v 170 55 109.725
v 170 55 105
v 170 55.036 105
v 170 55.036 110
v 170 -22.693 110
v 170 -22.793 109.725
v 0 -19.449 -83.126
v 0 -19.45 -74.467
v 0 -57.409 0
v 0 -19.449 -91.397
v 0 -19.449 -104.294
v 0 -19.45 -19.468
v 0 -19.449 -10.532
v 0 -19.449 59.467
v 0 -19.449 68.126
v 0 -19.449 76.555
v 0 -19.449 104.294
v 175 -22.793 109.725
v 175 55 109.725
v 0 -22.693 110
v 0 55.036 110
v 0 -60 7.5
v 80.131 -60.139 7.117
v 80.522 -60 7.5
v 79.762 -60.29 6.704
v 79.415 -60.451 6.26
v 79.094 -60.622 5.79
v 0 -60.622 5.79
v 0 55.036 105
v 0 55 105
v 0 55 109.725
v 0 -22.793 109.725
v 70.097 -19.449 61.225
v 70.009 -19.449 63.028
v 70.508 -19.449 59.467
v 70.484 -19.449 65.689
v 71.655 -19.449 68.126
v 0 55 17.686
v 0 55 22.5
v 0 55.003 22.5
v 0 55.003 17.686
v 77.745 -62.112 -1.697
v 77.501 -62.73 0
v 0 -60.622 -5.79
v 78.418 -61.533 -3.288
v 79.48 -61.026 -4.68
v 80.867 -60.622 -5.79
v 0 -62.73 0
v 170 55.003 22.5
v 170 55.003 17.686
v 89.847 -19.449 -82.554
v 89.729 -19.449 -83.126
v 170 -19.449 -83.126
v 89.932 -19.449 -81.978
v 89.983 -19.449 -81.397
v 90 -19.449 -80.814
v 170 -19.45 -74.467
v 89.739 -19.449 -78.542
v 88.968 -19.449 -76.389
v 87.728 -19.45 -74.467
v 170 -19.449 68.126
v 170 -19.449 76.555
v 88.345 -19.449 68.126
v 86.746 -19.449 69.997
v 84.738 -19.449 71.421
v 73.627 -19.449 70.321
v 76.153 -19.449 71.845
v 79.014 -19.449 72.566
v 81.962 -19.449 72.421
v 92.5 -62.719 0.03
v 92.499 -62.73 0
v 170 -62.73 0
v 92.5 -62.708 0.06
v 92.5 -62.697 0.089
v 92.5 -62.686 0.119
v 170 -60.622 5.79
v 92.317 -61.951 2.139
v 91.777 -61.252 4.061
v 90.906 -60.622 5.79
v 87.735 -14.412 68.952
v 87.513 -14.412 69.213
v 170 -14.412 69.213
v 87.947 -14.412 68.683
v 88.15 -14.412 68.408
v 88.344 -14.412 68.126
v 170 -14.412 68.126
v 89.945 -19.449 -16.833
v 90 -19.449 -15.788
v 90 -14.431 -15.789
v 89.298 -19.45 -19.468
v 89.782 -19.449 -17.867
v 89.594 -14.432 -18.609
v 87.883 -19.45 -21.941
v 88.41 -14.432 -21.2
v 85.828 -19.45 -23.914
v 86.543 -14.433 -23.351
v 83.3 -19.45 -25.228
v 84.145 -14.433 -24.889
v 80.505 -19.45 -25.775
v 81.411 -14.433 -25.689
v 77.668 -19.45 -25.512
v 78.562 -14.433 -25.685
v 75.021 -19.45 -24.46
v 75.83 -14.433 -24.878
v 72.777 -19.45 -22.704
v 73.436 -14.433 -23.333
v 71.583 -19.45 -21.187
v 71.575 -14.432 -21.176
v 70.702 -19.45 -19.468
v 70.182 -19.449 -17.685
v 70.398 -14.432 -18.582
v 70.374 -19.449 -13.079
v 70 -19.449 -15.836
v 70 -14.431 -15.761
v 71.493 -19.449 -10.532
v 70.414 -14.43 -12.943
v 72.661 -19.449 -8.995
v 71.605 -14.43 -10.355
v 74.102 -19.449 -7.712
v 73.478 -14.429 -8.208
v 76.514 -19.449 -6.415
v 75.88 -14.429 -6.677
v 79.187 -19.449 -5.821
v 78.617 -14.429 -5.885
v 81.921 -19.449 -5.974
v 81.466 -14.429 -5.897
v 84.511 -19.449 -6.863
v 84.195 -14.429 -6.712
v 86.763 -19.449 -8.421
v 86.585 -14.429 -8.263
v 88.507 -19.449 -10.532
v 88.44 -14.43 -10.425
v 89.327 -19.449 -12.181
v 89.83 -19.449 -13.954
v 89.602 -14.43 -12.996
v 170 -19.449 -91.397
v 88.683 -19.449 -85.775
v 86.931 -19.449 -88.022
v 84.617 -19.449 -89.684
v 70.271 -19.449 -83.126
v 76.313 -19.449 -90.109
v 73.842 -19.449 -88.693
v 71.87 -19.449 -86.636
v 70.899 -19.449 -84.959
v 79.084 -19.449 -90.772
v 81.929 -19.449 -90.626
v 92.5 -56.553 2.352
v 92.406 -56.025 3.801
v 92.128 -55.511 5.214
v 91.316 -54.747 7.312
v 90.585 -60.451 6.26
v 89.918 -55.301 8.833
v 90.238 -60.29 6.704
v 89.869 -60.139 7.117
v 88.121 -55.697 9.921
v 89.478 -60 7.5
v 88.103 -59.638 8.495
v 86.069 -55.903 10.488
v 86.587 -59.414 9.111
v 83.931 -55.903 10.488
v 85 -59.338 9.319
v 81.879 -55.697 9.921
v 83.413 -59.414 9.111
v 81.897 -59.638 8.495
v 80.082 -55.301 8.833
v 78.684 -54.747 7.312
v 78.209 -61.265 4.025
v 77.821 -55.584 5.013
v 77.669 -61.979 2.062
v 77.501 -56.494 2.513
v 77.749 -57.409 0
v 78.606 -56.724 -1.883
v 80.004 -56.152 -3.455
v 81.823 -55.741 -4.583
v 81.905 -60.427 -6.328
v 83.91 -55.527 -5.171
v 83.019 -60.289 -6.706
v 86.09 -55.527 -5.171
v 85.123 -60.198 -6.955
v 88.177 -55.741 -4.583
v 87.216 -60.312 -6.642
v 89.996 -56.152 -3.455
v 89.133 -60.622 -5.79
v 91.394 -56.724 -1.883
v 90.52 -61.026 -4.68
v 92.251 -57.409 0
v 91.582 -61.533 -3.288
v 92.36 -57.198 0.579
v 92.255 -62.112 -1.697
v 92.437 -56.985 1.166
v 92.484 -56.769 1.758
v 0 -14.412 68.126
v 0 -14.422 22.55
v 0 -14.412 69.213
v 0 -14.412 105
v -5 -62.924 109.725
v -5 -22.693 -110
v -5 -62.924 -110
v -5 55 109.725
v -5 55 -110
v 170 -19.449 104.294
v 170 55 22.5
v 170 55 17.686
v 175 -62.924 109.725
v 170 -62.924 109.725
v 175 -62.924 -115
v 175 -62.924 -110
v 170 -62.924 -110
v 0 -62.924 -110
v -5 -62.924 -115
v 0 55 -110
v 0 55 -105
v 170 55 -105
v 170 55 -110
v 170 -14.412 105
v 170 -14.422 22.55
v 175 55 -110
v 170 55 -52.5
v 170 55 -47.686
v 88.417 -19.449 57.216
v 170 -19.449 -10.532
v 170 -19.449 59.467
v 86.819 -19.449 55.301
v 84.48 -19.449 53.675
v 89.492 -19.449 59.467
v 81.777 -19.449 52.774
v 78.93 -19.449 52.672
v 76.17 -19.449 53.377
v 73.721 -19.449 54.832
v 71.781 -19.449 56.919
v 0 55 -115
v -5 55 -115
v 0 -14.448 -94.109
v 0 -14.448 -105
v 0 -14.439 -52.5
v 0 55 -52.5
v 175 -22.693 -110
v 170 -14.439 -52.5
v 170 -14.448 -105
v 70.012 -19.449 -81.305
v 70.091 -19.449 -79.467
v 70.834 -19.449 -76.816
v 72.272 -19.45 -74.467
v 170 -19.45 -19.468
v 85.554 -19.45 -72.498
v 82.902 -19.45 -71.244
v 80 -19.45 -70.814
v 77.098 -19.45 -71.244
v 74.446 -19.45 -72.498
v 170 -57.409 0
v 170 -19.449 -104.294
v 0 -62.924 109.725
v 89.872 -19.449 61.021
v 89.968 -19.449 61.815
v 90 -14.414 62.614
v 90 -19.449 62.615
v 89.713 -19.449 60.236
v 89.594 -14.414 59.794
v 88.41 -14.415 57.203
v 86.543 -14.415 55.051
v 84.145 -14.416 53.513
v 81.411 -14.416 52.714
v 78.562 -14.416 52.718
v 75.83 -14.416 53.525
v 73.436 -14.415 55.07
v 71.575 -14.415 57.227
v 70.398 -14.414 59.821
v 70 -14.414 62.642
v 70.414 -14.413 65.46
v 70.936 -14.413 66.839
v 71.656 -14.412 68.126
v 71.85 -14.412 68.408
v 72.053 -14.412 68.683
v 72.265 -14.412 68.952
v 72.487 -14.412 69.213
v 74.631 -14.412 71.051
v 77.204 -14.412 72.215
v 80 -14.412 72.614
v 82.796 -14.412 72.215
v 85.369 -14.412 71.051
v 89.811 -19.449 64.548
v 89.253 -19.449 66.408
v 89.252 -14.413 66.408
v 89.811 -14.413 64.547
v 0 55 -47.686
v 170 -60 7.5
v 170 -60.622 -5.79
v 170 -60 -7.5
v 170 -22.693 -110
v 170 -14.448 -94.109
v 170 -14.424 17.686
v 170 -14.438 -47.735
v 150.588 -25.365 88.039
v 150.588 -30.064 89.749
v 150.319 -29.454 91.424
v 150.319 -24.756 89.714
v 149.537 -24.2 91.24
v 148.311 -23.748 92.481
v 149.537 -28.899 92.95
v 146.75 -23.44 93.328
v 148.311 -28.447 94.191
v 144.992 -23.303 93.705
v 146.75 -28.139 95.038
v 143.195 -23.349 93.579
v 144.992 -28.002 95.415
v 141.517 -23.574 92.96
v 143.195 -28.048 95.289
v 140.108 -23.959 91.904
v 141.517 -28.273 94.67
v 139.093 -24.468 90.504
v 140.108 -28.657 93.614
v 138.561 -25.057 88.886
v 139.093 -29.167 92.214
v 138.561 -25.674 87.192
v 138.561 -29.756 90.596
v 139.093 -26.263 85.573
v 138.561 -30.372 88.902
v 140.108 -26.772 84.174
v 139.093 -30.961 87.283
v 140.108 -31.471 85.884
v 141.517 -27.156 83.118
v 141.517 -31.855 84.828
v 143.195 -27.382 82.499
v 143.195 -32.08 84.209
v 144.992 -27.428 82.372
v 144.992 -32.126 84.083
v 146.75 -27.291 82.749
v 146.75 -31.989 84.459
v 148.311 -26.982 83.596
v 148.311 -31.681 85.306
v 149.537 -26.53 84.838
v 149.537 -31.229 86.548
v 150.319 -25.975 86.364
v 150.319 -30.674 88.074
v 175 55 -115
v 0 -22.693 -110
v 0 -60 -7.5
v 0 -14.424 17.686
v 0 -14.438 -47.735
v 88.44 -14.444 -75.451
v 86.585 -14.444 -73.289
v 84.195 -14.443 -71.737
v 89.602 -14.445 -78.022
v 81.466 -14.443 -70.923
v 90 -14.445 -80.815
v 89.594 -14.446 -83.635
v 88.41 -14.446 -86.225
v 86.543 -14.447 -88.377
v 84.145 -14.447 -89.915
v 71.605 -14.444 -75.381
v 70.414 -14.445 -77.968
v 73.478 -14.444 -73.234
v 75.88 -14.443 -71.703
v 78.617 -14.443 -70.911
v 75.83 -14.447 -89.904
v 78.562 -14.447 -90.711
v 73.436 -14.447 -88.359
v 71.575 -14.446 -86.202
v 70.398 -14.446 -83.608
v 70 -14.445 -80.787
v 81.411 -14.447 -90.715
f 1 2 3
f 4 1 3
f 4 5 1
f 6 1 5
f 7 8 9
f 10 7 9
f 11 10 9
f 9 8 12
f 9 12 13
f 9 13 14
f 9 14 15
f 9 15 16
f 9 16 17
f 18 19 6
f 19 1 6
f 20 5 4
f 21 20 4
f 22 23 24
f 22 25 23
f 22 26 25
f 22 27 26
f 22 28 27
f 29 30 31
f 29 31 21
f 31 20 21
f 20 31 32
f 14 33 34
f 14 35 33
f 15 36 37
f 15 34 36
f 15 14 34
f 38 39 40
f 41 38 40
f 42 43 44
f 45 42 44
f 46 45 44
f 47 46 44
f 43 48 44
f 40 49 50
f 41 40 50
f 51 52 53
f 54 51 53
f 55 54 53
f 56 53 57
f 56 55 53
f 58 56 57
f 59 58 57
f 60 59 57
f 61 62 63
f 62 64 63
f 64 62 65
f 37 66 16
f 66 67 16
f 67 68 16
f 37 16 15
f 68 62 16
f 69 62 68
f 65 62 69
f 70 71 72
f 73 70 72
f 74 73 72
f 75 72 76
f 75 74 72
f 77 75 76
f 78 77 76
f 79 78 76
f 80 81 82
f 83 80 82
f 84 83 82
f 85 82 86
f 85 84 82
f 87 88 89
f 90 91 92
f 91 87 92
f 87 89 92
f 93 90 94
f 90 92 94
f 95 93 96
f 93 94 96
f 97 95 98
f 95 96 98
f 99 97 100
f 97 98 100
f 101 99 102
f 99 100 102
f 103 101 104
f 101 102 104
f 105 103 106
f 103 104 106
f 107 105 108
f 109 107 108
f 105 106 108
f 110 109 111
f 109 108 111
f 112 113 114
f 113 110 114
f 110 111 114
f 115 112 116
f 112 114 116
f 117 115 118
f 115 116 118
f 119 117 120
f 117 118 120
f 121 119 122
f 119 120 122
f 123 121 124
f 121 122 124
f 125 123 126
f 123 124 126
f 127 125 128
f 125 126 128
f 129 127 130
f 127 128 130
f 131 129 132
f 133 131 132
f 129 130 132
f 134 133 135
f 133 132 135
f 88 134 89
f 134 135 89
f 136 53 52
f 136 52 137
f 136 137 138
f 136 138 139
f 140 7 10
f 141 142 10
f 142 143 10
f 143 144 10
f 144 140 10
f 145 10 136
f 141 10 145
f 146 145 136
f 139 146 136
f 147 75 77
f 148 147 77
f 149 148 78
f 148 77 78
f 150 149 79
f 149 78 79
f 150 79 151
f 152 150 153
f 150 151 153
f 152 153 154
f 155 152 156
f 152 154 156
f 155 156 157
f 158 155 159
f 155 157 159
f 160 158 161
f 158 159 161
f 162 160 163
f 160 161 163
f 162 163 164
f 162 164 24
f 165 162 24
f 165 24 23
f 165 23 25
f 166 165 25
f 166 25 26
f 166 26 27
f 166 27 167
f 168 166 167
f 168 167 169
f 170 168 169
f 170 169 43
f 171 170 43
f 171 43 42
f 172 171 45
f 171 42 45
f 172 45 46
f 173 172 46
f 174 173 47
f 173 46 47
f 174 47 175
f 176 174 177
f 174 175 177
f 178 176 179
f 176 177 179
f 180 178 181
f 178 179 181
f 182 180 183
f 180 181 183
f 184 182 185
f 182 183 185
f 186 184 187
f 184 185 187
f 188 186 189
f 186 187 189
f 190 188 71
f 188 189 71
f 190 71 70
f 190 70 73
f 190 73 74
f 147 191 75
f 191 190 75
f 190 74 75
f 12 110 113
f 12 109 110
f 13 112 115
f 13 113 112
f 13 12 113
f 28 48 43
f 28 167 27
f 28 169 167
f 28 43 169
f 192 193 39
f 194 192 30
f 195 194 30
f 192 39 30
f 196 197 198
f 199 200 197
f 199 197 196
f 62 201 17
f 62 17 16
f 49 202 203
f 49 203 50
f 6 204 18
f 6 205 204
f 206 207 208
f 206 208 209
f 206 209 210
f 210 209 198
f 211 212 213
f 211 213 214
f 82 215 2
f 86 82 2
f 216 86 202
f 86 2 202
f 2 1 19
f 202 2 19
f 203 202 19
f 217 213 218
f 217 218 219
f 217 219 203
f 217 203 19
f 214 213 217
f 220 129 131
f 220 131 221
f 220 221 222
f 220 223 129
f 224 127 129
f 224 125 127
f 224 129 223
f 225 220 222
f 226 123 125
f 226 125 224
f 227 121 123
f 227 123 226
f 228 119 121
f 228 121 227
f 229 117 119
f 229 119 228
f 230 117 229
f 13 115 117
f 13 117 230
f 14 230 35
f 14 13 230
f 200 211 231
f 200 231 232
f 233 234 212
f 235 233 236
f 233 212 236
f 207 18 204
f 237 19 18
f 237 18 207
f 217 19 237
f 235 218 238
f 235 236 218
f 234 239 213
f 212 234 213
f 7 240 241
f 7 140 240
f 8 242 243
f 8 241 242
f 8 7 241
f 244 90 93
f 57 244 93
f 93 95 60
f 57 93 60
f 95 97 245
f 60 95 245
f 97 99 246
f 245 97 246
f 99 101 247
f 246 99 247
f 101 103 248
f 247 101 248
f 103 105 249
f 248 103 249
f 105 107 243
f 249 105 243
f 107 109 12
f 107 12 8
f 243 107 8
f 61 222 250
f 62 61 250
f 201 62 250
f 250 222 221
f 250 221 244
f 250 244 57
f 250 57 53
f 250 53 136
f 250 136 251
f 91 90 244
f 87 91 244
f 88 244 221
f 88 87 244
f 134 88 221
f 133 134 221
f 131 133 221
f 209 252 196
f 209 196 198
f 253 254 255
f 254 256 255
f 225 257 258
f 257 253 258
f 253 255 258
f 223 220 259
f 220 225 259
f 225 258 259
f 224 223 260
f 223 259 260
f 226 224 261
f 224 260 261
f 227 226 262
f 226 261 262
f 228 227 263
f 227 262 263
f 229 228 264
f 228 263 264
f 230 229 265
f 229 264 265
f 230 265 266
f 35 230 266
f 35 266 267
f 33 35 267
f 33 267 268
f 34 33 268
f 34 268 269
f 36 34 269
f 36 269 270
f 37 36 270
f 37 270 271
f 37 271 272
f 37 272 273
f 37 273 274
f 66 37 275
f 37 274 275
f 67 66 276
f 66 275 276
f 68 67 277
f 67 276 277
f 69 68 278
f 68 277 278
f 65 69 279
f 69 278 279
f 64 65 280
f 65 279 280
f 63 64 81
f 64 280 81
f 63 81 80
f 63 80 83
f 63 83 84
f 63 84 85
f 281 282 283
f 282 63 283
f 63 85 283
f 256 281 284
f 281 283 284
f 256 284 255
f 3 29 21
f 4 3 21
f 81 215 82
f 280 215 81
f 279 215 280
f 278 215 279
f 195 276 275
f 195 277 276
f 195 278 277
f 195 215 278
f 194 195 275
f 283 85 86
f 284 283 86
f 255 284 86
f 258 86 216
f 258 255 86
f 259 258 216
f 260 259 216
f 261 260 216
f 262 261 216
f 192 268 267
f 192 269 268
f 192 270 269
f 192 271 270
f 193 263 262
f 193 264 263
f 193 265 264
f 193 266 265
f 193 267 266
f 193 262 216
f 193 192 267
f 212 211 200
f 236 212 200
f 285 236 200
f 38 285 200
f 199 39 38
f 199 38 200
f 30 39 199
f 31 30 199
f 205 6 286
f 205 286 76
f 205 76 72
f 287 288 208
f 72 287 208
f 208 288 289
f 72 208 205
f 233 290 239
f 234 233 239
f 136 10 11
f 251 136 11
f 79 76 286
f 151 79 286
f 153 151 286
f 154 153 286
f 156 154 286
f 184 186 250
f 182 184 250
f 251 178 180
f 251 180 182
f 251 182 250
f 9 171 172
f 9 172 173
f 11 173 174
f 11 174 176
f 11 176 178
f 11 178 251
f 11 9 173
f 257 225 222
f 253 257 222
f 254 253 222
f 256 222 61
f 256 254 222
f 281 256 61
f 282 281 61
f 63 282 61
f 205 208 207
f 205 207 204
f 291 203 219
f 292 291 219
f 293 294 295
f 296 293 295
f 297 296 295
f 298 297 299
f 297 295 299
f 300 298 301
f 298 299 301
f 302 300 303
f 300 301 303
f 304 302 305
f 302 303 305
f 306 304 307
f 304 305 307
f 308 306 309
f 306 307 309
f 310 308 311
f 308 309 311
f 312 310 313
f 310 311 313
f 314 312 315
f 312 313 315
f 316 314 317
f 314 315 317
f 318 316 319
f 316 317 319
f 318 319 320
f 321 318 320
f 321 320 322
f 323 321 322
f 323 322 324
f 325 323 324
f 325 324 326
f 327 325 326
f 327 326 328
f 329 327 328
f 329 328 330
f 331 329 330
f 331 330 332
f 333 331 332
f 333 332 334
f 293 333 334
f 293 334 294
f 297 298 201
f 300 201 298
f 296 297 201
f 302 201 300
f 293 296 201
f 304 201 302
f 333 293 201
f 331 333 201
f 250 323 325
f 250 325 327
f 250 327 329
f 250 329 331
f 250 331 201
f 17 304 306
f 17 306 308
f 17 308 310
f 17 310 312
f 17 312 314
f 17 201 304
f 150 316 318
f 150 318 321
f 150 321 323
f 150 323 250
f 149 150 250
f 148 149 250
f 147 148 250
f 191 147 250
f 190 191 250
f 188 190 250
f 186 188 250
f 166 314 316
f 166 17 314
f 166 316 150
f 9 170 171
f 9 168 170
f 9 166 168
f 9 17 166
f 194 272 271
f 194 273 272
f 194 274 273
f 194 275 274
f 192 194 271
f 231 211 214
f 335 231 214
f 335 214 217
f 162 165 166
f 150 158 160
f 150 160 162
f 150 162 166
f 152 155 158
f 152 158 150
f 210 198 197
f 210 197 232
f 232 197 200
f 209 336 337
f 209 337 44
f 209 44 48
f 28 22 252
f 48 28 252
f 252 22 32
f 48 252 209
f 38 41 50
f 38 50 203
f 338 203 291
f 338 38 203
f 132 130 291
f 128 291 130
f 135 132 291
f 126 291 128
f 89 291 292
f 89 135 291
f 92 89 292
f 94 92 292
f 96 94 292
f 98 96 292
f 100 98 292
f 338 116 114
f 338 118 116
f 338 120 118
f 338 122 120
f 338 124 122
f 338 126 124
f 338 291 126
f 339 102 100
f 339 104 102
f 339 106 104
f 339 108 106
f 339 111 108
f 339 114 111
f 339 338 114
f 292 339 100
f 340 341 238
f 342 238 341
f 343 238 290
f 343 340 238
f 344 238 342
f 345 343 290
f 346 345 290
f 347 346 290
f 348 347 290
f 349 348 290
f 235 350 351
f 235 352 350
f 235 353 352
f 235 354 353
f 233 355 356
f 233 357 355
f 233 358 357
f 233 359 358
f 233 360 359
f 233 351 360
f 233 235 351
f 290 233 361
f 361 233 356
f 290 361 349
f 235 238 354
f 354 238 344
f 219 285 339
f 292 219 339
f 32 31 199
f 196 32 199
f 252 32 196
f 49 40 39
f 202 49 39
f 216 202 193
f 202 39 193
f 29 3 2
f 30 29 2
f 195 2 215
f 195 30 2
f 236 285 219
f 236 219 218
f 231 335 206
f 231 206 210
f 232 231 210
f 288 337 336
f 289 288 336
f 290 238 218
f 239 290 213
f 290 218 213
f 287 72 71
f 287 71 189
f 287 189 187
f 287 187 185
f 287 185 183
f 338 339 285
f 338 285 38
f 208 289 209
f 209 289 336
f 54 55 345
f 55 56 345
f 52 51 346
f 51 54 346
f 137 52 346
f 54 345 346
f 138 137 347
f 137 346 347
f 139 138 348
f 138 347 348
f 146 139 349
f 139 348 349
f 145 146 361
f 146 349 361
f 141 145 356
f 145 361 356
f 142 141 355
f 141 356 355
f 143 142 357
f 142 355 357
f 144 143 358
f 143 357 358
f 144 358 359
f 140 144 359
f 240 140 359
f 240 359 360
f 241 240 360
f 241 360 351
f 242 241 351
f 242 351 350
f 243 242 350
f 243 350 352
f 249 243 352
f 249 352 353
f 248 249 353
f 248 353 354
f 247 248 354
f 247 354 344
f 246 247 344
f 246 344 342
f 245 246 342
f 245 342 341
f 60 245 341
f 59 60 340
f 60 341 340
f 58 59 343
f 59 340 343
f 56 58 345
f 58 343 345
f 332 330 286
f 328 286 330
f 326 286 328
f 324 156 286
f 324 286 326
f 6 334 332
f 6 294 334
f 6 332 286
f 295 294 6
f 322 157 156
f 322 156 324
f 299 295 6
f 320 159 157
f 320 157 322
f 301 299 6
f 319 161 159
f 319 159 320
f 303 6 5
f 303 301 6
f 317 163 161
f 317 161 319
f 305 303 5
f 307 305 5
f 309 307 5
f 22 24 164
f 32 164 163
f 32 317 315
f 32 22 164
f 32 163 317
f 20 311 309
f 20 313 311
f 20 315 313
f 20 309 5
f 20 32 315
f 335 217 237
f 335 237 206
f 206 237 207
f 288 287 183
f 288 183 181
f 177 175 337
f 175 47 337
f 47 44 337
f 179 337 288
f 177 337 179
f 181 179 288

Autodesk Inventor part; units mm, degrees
ref_plane "YZ Plane" through (0, 0, 0) normal (1, 0, 0) x (0, 1, 0)
ref_plane "XZ Plane" through (0, 0, 0) normal (0, 1, 0) x (-1, 0, 0)
ref_plane "XY Plane" through (0, 0, 0) normal (0, 0, 1) x (1, 0, 0)
sketch "Sketch1" plane through (0, 0, 0) normal (1, 0, 0) x (0, 1, 0)
  line L0 (-22.6931, 110) -> (55.0359, 110)
  line L1 (55, -110) -> (-22.6931, -110)
  line L2 (-62.7298, 0) -> (-22.6931, -110)
  line L3 (-62.7298, 0) -> (-22.6931, 110)
  line L4 (-57.4089, 0) -> (-19.449, -104.2938)
  line L5 (-14.4482, -105) -> (55, -105)
  line L6 (55.0359, 105) -> (-14.4122, 105)
  line L7 (-19.449, 104.2938) -> (-57.4089, 0)
  line L8 (55.0034, 17.6855) -> (-14.4593, 17.6855)
  line L9 (55.0034, 22.5) -> (-14.4456, 22.5496)
  line L10 (55, -52.5) -> (-14.449, -52.5)
  line L11 (55, -47.6855) -> (-14.449, -47.7352)
  line L12 (-60.6224, -5.7899) -> (-60, -7.5)
  line L13 (-60.6224, 5.7899) -> (-60, 7.5)
  line L14 (-14.4122, 105) -> (-14.4122, 68.1255)
  line L15 (-14.4456, 59.4672) -> (-14.4456, 22.5496)
  line L16 (-19.449, 104.2938) -> (-19.449, 68.1255)
  line L17 (-14.4593, 17.6855) -> (-14.4593, -10.5317)
  line L18 (-14.449, -19.4683) -> (-14.449, -47.7352)
  line L19 (-19.4705, 59.4672) -> (-19.4705, -10.5317)
  line L20 (-14.449, -52.5) -> (-14.449, -74.4672)
  line L21 (-14.4482, -83.1255) -> (-14.4482, -105.0928)
  line L22 (-19.4499, -19.4683) -> (-19.4499, -74.4672)
  line L23 (-19.449, -83.1255) -> (-19.449, -104.2938)
  line L24 (-19.449, -74.4672) -> (-19.4499, -74.4672)
  line L25 (-14.4593, -83.1255) -> (-14.4482, -83.1255)
  line L26 (-19.4499, -19.4683) -> (-19.449, -19.4683)
  line L27 (-19.4705, -10.5317) -> (-19.449, -10.5317)
  line L28 (-14.4122, 68.1255) -> (-14.4125, 68.1255)
  line L29 (-19.4705, 59.4672) -> (-19.449, 59.4672)
  line L30 (55.0359, 105) -> (55.0359, 110)
  line L31 (55.0034, 22.5) -> (55.0034, 17.6855)
  line L32 (55, -47.6855) -> (55, -52.5)
  line L33 (55, -105) -> (55, -110)
  line L34 (-19.449, -91.3967) -> (-19.449, 76.5553)
  line L35 (-14.4122, 69.213) -> (-14.4225, 22.5496)
  line L36 (-14.4236, 17.6855) -> (-14.438, -47.7351)
  line L37 (-14.439, -52.5) -> (-14.4482, -94.1091)
  point P0 (0, 0)
extrude "Extrusion1" add sketch "Sketch1" along normal blind 170
sketch "Sketch2" plane through (0, -14.4236, 17.6855) normal (0, 1, -0.0002) x (1, 0, 0)
  circle A0 centre (80, 33.4744) radius 10
  circle A1 centre (80, 98.5003) radius 10
  circle A2 centre (80, -44.9284) radius 10
  point P0 (0, 17.6824)
  dimension "d24" = 20
  dimension "d25" = 20
  dimension "d26" = 20
extrude "Extrusion2" cut sketch "Sketch2" against normal blind 6
sketch "Sketch3" plane through (0, -22.6931, -110) normal (0, -0.9397, -0.342) x (1, 0, 0)
  point P0 (0, 95.6047)
sketch "Sketch4" plane through (0, -22.6931, -110) normal (0, -0.9397, -0.342) x (1, 0, 0)
  line L0 (0, 117.1568) -> (170, 117.1568) projected
  circle A0 centre (85, 117.1568) radius 7.5
  point P0 (0, 95.6047)
  dimension "d29" = 15
extrude "Extrusion3" cut sketch "Sketch4" against normal blind 10
sketch "Sketch5" plane through (0, 0, 0) normal (-1, 0, 0) x (0, 0, 1)
  line L0 (-110, -22.6931) -> (-110, 55) projected
  line L1 (-110, 55) -> (109.7253, 55)
  line L2 (109.7253, 55) -> (109.7253, -62.9244)
  line L3 (109.7253, -62.9244) -> (-110, -62.9244)
  line L4 (-110, -62.9244) -> (-110, 55)
  point P0 (0, 0)
extrude "Extrusion4" add sketch "Sketch5" along normal blind 5
sketch "Sketch6" plane through (170, 0, 0) normal (1, 0, 0) x (0, 0, -1)
  line L0 (-109.7253, 55) -> (-109.7253, -22.793) projected
  line L1 (110, -22.6931) -> (110, -62.9244) projected
  line L2 (-109.7253, 55) -> (110, 55)
  line L3 (110, 55) -> (110, -62.9244)
  line L4 (110, -62.9244) -> (-109.7253, -62.9244)
  line L5 (-109.7253, -62.9244) -> (-109.7253, 55)
  point P0 (0, 0)
extrude "Extrusion5" add sketch "Sketch6" along normal blind 5
sketch "Sketch7" plane through (0, -62.9244, 109.7253) normal (0, 0, 1) x (1, 0, 0)
  line L0 (-5, 117.9244) -> (175, 117.9244) projected
  line L1 (-5, 117.9244) -> (175, 117.9244)
  line L2 (175, 117.9244) -> (175, 0)
  line L3 (175, 0) -> (-5, 0)
  line L4 (-5, 0) -> (-5, 117.9244)
  line L5 (175, 0) -> (-5, 0)
  line L6 (-5, 0) -> (-5, 117.9244)
  line L7 (-5, 117.9244) -> (175, 117.9244)
  line L8 (175, 117.9244) -> (175, 0)
  point P0 (0, 62.9244)
sketch "Sketch8" plane through (0, -22.6931, 110) normal (0, -0.9397, 0.342) x (1, 0, 0)
  circle A0 centre (144.5406, -21.5508) radius 6.0469
  point P0 (0, -95.6047)
extrude "Extrusion6" cut sketch "Sketch8" against normal blind 6
sketch "Sketch9" plane through (0, -62.9244, -110) normal (0, 0, -1) x (-1, 0, 0)
  line L0 (-175, 117.9244) -> (-175, 0) projected
  line L1 (0, 117.9244) -> (5, 117.9244) projected
  line L2 (-175, 0) -> (5, 0)
  line L3 (5, 0) -> (5, 117.9244)
  line L4 (5, 117.9244) -> (-175, 117.9244)
  line L5 (-175, 117.9244) -> (-175, 0)
  point P0 (0, 62.9244)
  point P1 (-175, 117.9244)
extrude "Extrusion7" add sketch "Sketch9" along normal blind 5
properties part number "container unit" material "Pine, Southern"
